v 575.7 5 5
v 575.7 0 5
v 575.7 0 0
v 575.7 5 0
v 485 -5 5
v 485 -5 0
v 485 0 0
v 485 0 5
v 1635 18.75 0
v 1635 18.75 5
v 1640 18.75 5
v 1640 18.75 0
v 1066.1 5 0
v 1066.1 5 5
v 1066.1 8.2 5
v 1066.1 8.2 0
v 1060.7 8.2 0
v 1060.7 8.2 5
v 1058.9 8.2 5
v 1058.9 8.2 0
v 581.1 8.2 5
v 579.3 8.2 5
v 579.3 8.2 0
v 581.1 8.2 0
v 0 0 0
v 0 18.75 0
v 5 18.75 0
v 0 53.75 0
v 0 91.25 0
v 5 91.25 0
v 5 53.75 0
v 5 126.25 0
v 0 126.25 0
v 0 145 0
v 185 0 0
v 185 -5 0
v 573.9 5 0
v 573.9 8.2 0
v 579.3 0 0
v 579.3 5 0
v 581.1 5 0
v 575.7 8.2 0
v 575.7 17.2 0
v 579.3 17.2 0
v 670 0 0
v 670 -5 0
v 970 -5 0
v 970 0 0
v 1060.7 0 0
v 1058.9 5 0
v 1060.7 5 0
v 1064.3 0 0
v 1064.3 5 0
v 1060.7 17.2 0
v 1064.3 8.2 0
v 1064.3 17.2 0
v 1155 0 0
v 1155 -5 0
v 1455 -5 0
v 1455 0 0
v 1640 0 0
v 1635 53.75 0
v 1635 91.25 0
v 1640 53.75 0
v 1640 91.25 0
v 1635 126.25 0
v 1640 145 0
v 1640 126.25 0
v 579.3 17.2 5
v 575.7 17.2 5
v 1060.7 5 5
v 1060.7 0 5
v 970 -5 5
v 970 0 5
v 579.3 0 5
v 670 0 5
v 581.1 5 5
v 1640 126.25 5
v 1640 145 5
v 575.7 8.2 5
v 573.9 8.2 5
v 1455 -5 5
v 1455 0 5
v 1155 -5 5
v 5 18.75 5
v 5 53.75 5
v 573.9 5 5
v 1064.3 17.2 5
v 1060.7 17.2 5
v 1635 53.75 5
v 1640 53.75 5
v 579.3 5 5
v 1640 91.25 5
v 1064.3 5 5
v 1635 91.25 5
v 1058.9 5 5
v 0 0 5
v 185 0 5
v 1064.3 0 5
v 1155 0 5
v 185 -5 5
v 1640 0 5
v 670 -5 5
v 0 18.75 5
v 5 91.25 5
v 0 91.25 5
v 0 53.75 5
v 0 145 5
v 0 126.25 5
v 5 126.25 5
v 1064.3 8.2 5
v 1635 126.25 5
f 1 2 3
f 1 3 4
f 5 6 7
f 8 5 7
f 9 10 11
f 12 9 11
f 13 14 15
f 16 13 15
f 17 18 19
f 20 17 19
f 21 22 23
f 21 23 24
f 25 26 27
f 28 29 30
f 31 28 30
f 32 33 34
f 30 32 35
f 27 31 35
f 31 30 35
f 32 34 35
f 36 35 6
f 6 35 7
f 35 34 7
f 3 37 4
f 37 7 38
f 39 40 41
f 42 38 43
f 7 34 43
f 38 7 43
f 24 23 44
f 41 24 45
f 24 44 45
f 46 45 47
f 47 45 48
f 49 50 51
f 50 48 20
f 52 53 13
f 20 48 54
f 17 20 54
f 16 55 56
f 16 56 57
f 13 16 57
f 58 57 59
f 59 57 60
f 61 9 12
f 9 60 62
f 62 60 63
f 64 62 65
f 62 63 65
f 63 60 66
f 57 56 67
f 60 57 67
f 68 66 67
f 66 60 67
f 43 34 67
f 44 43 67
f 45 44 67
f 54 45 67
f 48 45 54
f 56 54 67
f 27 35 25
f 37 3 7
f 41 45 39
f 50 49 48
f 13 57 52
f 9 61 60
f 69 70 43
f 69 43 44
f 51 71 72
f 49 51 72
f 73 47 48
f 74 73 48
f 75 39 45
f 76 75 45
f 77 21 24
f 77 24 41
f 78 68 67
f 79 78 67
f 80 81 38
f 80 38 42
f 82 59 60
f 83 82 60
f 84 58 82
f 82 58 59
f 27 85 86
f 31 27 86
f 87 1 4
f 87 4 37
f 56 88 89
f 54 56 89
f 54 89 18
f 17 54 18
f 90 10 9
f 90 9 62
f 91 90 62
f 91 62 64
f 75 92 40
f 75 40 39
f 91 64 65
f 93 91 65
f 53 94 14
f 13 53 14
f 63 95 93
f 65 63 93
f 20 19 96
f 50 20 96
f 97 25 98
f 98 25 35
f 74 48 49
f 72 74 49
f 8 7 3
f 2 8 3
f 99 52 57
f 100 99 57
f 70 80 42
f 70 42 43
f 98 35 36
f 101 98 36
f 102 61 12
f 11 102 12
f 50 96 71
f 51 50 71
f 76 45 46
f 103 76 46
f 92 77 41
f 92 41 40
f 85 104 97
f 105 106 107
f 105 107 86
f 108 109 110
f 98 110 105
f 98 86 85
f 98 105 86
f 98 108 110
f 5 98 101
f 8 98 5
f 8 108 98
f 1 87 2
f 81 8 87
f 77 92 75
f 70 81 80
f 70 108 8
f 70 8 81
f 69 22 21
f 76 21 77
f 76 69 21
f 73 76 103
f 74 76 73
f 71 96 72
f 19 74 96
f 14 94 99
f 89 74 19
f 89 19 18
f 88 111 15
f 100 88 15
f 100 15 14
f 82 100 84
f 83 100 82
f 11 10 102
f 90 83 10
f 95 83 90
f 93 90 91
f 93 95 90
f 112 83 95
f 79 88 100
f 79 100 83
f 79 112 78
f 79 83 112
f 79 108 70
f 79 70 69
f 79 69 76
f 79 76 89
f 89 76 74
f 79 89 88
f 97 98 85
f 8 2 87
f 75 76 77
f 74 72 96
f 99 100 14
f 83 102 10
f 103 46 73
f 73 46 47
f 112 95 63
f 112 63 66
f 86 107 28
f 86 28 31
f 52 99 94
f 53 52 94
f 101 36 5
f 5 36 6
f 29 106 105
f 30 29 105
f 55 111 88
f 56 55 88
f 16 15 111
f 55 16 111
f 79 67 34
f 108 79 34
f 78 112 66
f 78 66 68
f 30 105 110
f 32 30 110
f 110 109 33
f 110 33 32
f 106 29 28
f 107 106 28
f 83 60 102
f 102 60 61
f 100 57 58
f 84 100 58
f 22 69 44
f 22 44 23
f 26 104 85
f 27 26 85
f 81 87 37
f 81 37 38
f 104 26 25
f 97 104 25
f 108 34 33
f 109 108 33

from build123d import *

# Parameters (mm, degrees)
SALIENTE_EXTRUIR1_DEPTH = 5
CROQUIS2_W              = 5
CROQUIS2_H              = 35
CORTAR_EXTRUIR1_DEPTH   = 5
CORTAR_EXTRUIR2_DEPTH   = 10


with BuildPart() as part:
    # Croquis1 → Saliente-Extruir1 (new body)
    with BuildSketch(Plane.XY):
        Polygon((0, 145), (0, 0), (183.734642654, 0), (185, 0), (185, -5), (485, -5), (485, 0), (670, 0), (670, -5), (970, -5), (970, 0), (1155, 0), (1155, -5), (1455, -5), (1455, 0), (1640, 0), (1640, 145), align=None)
    extrude(amount=SALIENTE_EXTRUIR1_DEPTH)

    # Croquis2 → Cortar-Extruir1 (cut)
    with BuildSketch(Plane.XY.offset(5)):
        with Locations((1637.5, 108.75)):
            Rectangle(CROQUIS2_W, CROQUIS2_H)
        with Locations((1637.5, 36.25)):
            Rectangle(CROQUIS2_W, CROQUIS2_H)
        with Locations((2.5, 36.25)):
            Rectangle(CROQUIS2_W, CROQUIS2_H)
        with Locations((2.5, 108.75)):
            Rectangle(CROQUIS2_W, CROQUIS2_H)
    extrude(amount=-CORTAR_EXTRUIR1_DEPTH, mode=Mode.SUBTRACT)

    # Croquis3 → Cortar-Extruir2 (cut)
    with BuildSketch(Plane.XY.offset(5)):
        Polygon((579.3, 0), (575.7, 0), (575.7, 5), (573.9, 5), (573.9, 8.2), (575.7, 8.2), (575.7, 17.2), (579.3, 17.2), (579.3, 8.2), (581.1, 8.2), (581.1, 5), (579.3, 5), align=None)
        Polygon((1064.3, 8.2), (1064.3, 17.2), (1060.7, 17.2), (1060.7, 8.2), (1058.9, 8.2), (1058.9, 5), (1060.7, 5), (1060.7, 0), (1064.3, 0), (1064.3, 5), (1066.1, 5), (1066.1, 8.2), align=None)
    extrude(amount=-CORTAR_EXTRUIR2_DEPTH, mode=Mode.SUBTRACT)


solid = part.part
